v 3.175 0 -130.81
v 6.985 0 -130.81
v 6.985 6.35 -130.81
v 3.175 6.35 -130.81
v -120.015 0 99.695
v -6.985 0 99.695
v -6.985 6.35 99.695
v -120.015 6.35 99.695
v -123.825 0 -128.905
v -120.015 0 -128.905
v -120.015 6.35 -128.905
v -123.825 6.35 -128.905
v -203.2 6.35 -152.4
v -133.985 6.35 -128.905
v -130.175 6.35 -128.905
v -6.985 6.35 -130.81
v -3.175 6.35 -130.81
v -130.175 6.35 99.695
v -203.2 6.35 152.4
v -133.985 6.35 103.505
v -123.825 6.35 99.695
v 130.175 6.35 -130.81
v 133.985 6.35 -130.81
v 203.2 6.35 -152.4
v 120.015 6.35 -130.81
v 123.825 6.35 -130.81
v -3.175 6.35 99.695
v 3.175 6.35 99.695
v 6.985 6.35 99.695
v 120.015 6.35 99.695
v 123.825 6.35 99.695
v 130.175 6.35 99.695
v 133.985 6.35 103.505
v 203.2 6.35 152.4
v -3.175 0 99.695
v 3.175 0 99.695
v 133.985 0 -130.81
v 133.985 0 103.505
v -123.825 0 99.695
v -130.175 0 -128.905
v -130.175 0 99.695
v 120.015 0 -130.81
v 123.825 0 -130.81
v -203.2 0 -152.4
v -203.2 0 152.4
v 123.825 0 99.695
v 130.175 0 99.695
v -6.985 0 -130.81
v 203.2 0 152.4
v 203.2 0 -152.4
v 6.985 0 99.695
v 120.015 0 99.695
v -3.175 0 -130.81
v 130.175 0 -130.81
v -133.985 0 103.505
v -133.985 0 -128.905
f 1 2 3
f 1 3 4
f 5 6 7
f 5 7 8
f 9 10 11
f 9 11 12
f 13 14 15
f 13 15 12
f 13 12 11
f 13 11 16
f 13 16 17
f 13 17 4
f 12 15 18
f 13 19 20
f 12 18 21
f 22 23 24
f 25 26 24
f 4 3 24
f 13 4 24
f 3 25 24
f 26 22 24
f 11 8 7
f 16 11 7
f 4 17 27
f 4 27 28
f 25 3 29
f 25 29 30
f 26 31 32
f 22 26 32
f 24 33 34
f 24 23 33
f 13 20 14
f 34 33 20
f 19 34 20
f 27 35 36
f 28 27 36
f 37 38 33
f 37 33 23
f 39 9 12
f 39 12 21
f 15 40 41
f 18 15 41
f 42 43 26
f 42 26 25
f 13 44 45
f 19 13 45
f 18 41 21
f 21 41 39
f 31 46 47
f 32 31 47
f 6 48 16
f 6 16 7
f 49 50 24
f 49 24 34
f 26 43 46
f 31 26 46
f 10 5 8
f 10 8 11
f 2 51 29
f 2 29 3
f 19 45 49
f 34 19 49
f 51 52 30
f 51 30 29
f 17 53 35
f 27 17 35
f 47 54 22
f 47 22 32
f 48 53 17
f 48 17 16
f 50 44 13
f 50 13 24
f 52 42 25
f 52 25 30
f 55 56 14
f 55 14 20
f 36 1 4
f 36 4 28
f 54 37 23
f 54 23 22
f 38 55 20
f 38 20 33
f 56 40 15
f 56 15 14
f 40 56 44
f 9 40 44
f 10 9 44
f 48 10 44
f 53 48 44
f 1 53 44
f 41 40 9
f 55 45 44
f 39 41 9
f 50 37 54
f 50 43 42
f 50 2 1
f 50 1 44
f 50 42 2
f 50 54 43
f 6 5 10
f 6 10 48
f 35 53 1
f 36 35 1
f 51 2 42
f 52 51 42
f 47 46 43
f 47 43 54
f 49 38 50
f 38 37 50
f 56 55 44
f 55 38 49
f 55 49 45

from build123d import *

# Parameters (mm, degrees)
F0_W     = 406.4
F0_H     = 304.8
F0_W_2   = 6.35
F0_H_2   = 46.99
F0_H_3   = 27.305
F0_H_4   = 228.6
F0_H_5   = 230.505
F0_H_6   = 45.085
F1_DEPTH = 6.35


with BuildPart() as f1:
    # F0 (on Front) → F1 (new body)
    with BuildSketch(Plane.XZ):
        Rectangle(F0_W, F0_H)
        Polygon((-3.175, 130.81), (3.175, 130.81), (3.175, 103.505), (6.985, 103.505), (120.015, 103.505), (123.825, 103.505), (123.825, 148.59), (130.175, 148.59), (130.175, 103.505), (133.985, 103.505), (133.985, 99.695), (133.985, -130.81), (130.175, -130.81), (123.825, -130.81), (120.015, -130.81), (120.015, 99.695), (6.985, 99.695), (6.985, -130.81), (3.175, -130.81), (-3.175, -130.81), (-6.985, -130.81), (-6.985, 99.695), (-120.015, 99.695), (-120.015, -128.905), (-123.825, -128.905), (-130.175, -128.905), (-133.985, -128.905), (-133.985, 99.695), (-133.985, 103.505), (-130.175, 103.505), (-130.175, 150.495), (-123.825, 150.495), (-123.825, 103.505), (-120.015, 103.505), (-6.985, 103.505), (-3.175, 103.505), align=None, mode=Mode.SUBTRACT)
        with Locations((-127, 127)):
            Rectangle(F0_W_2, F0_H_2)
        with Locations((0, 117.1575)):
            Rectangle(F0_W_2, F0_H_3)
        with Locations((-127, -14.605)):
            Rectangle(F0_W_2, F0_H_4)
        with Locations((0, -15.5575)):
            Rectangle(F0_W_2, F0_H_5)
        with Locations((127, 126.0475)):
            Rectangle(F0_W_2, F0_H_6)
        with Locations((127, -15.5575)):
            Rectangle(F0_W_2, F0_H_5)
    extrude(amount=-F1_DEPTH)


solid = f1.part
